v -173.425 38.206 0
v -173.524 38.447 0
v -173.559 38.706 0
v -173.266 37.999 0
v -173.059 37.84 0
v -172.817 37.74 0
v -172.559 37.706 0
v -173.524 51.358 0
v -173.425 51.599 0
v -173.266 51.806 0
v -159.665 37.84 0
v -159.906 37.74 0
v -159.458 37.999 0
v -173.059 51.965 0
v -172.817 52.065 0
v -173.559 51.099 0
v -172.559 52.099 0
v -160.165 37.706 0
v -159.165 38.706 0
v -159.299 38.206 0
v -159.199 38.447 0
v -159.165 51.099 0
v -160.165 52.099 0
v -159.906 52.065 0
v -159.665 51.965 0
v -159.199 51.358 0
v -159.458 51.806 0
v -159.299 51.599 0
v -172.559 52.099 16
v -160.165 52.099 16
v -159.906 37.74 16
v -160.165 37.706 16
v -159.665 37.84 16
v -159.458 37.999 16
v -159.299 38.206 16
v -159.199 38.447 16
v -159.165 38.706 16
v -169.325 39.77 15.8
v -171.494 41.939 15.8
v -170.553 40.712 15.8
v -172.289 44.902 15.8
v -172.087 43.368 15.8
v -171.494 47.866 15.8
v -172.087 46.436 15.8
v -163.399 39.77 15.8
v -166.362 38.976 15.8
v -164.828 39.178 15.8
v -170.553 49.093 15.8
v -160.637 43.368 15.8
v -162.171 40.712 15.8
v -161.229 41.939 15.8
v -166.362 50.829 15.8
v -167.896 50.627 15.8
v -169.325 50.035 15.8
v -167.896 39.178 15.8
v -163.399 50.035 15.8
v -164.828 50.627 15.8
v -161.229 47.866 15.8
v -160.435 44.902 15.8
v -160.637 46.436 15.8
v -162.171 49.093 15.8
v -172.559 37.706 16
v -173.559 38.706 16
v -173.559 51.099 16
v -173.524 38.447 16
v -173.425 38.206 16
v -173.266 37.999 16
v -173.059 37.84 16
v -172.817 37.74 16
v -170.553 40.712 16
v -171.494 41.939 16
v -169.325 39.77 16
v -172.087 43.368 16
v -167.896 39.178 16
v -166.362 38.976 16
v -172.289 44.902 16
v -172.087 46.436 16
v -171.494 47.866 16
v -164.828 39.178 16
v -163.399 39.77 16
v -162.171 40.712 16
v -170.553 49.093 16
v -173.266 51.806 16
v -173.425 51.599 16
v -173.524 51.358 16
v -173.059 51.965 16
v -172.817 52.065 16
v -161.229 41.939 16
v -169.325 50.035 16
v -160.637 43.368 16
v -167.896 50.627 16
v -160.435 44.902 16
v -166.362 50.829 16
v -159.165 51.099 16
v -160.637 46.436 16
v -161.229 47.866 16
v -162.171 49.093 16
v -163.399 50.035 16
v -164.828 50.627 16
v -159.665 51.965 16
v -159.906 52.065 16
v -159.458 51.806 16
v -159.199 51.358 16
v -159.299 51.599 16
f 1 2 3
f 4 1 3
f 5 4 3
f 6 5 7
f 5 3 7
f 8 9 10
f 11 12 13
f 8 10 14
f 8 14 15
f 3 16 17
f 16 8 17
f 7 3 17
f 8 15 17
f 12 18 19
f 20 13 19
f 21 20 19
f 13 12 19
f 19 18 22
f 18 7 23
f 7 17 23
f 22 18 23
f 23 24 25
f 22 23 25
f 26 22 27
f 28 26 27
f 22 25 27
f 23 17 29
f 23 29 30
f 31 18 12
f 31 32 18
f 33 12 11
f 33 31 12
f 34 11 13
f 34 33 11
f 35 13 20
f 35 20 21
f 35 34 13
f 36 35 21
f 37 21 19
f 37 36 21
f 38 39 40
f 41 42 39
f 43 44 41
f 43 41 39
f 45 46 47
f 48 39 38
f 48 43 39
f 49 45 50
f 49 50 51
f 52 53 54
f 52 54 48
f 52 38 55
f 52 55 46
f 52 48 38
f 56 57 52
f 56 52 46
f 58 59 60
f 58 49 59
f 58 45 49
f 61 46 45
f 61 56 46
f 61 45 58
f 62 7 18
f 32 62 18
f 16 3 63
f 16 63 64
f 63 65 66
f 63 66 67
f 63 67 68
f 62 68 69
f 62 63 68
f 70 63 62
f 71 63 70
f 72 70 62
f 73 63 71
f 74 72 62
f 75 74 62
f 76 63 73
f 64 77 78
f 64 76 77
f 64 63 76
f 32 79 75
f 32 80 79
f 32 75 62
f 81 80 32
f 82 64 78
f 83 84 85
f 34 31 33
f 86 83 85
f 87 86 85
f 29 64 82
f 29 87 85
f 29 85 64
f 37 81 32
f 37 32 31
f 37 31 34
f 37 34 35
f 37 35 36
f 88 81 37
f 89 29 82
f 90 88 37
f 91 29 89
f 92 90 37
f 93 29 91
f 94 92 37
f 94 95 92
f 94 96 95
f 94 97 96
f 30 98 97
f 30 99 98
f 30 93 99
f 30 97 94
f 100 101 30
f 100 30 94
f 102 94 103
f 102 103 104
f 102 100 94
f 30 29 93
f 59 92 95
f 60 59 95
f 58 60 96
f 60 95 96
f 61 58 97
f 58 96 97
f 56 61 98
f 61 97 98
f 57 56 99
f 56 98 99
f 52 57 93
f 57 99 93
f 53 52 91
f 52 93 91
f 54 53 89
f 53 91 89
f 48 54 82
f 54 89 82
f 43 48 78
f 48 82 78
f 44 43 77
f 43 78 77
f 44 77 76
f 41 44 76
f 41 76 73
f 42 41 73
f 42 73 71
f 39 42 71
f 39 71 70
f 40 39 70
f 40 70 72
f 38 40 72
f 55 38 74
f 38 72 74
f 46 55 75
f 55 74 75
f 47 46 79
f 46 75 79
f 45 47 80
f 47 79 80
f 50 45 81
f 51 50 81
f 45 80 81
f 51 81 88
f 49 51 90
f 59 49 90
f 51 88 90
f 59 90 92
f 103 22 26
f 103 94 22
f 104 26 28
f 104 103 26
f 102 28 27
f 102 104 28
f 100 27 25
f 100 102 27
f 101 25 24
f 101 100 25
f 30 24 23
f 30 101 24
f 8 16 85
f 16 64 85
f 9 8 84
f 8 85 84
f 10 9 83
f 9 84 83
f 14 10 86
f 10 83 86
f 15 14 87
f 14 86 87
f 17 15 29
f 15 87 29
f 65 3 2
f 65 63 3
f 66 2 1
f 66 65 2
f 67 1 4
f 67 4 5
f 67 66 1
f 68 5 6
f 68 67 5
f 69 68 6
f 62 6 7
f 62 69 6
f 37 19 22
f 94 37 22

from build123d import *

# Parameters (mm, degrees)
SKETCH1_W           = 14.393333334
SKETCH1_H           = 14.393333333
BOSS_EXTRUDE1_DEPTH = 16
FILLET1_R           = 1
SKETCH2_R           = 5.926666667
CUT_EXTRUDE1_DEPTH  = 0.2


with BuildPart() as part:
    # Sketch1 → Boss-Extrude1 (new body)
    with BuildSketch(Plane.XY):
        with Locations((-166.361835023, 44.90232352)):
            Rectangle(SKETCH1_W, SKETCH1_H)
    extrude(amount=BOSS_EXTRUDE1_DEPTH)

    # Fillet1
    fillet1_edges = [part.edges().sort_by_distance(p)[0] for p in [
        (-159.165168356, 37.705656853, 8),
        (-173.55850169, 37.705656853, 8),
        (-173.55850169, 52.098990186, 8),
        (-159.165168356, 52.098990186, 8),
    ]]
    fillet(fillet1_edges, radius=FILLET1_R)

    # Sketch2 → Cut-Extrude1 (cut)
    with BuildSketch(Plane.XY.offset(16)):
        with Locations((-166.361835023, 44.902323519)):
            Circle(SKETCH2_R)
    extrude(amount=-CUT_EXTRUDE1_DEPTH, mode=Mode.SUBTRACT)


solid = part.part
